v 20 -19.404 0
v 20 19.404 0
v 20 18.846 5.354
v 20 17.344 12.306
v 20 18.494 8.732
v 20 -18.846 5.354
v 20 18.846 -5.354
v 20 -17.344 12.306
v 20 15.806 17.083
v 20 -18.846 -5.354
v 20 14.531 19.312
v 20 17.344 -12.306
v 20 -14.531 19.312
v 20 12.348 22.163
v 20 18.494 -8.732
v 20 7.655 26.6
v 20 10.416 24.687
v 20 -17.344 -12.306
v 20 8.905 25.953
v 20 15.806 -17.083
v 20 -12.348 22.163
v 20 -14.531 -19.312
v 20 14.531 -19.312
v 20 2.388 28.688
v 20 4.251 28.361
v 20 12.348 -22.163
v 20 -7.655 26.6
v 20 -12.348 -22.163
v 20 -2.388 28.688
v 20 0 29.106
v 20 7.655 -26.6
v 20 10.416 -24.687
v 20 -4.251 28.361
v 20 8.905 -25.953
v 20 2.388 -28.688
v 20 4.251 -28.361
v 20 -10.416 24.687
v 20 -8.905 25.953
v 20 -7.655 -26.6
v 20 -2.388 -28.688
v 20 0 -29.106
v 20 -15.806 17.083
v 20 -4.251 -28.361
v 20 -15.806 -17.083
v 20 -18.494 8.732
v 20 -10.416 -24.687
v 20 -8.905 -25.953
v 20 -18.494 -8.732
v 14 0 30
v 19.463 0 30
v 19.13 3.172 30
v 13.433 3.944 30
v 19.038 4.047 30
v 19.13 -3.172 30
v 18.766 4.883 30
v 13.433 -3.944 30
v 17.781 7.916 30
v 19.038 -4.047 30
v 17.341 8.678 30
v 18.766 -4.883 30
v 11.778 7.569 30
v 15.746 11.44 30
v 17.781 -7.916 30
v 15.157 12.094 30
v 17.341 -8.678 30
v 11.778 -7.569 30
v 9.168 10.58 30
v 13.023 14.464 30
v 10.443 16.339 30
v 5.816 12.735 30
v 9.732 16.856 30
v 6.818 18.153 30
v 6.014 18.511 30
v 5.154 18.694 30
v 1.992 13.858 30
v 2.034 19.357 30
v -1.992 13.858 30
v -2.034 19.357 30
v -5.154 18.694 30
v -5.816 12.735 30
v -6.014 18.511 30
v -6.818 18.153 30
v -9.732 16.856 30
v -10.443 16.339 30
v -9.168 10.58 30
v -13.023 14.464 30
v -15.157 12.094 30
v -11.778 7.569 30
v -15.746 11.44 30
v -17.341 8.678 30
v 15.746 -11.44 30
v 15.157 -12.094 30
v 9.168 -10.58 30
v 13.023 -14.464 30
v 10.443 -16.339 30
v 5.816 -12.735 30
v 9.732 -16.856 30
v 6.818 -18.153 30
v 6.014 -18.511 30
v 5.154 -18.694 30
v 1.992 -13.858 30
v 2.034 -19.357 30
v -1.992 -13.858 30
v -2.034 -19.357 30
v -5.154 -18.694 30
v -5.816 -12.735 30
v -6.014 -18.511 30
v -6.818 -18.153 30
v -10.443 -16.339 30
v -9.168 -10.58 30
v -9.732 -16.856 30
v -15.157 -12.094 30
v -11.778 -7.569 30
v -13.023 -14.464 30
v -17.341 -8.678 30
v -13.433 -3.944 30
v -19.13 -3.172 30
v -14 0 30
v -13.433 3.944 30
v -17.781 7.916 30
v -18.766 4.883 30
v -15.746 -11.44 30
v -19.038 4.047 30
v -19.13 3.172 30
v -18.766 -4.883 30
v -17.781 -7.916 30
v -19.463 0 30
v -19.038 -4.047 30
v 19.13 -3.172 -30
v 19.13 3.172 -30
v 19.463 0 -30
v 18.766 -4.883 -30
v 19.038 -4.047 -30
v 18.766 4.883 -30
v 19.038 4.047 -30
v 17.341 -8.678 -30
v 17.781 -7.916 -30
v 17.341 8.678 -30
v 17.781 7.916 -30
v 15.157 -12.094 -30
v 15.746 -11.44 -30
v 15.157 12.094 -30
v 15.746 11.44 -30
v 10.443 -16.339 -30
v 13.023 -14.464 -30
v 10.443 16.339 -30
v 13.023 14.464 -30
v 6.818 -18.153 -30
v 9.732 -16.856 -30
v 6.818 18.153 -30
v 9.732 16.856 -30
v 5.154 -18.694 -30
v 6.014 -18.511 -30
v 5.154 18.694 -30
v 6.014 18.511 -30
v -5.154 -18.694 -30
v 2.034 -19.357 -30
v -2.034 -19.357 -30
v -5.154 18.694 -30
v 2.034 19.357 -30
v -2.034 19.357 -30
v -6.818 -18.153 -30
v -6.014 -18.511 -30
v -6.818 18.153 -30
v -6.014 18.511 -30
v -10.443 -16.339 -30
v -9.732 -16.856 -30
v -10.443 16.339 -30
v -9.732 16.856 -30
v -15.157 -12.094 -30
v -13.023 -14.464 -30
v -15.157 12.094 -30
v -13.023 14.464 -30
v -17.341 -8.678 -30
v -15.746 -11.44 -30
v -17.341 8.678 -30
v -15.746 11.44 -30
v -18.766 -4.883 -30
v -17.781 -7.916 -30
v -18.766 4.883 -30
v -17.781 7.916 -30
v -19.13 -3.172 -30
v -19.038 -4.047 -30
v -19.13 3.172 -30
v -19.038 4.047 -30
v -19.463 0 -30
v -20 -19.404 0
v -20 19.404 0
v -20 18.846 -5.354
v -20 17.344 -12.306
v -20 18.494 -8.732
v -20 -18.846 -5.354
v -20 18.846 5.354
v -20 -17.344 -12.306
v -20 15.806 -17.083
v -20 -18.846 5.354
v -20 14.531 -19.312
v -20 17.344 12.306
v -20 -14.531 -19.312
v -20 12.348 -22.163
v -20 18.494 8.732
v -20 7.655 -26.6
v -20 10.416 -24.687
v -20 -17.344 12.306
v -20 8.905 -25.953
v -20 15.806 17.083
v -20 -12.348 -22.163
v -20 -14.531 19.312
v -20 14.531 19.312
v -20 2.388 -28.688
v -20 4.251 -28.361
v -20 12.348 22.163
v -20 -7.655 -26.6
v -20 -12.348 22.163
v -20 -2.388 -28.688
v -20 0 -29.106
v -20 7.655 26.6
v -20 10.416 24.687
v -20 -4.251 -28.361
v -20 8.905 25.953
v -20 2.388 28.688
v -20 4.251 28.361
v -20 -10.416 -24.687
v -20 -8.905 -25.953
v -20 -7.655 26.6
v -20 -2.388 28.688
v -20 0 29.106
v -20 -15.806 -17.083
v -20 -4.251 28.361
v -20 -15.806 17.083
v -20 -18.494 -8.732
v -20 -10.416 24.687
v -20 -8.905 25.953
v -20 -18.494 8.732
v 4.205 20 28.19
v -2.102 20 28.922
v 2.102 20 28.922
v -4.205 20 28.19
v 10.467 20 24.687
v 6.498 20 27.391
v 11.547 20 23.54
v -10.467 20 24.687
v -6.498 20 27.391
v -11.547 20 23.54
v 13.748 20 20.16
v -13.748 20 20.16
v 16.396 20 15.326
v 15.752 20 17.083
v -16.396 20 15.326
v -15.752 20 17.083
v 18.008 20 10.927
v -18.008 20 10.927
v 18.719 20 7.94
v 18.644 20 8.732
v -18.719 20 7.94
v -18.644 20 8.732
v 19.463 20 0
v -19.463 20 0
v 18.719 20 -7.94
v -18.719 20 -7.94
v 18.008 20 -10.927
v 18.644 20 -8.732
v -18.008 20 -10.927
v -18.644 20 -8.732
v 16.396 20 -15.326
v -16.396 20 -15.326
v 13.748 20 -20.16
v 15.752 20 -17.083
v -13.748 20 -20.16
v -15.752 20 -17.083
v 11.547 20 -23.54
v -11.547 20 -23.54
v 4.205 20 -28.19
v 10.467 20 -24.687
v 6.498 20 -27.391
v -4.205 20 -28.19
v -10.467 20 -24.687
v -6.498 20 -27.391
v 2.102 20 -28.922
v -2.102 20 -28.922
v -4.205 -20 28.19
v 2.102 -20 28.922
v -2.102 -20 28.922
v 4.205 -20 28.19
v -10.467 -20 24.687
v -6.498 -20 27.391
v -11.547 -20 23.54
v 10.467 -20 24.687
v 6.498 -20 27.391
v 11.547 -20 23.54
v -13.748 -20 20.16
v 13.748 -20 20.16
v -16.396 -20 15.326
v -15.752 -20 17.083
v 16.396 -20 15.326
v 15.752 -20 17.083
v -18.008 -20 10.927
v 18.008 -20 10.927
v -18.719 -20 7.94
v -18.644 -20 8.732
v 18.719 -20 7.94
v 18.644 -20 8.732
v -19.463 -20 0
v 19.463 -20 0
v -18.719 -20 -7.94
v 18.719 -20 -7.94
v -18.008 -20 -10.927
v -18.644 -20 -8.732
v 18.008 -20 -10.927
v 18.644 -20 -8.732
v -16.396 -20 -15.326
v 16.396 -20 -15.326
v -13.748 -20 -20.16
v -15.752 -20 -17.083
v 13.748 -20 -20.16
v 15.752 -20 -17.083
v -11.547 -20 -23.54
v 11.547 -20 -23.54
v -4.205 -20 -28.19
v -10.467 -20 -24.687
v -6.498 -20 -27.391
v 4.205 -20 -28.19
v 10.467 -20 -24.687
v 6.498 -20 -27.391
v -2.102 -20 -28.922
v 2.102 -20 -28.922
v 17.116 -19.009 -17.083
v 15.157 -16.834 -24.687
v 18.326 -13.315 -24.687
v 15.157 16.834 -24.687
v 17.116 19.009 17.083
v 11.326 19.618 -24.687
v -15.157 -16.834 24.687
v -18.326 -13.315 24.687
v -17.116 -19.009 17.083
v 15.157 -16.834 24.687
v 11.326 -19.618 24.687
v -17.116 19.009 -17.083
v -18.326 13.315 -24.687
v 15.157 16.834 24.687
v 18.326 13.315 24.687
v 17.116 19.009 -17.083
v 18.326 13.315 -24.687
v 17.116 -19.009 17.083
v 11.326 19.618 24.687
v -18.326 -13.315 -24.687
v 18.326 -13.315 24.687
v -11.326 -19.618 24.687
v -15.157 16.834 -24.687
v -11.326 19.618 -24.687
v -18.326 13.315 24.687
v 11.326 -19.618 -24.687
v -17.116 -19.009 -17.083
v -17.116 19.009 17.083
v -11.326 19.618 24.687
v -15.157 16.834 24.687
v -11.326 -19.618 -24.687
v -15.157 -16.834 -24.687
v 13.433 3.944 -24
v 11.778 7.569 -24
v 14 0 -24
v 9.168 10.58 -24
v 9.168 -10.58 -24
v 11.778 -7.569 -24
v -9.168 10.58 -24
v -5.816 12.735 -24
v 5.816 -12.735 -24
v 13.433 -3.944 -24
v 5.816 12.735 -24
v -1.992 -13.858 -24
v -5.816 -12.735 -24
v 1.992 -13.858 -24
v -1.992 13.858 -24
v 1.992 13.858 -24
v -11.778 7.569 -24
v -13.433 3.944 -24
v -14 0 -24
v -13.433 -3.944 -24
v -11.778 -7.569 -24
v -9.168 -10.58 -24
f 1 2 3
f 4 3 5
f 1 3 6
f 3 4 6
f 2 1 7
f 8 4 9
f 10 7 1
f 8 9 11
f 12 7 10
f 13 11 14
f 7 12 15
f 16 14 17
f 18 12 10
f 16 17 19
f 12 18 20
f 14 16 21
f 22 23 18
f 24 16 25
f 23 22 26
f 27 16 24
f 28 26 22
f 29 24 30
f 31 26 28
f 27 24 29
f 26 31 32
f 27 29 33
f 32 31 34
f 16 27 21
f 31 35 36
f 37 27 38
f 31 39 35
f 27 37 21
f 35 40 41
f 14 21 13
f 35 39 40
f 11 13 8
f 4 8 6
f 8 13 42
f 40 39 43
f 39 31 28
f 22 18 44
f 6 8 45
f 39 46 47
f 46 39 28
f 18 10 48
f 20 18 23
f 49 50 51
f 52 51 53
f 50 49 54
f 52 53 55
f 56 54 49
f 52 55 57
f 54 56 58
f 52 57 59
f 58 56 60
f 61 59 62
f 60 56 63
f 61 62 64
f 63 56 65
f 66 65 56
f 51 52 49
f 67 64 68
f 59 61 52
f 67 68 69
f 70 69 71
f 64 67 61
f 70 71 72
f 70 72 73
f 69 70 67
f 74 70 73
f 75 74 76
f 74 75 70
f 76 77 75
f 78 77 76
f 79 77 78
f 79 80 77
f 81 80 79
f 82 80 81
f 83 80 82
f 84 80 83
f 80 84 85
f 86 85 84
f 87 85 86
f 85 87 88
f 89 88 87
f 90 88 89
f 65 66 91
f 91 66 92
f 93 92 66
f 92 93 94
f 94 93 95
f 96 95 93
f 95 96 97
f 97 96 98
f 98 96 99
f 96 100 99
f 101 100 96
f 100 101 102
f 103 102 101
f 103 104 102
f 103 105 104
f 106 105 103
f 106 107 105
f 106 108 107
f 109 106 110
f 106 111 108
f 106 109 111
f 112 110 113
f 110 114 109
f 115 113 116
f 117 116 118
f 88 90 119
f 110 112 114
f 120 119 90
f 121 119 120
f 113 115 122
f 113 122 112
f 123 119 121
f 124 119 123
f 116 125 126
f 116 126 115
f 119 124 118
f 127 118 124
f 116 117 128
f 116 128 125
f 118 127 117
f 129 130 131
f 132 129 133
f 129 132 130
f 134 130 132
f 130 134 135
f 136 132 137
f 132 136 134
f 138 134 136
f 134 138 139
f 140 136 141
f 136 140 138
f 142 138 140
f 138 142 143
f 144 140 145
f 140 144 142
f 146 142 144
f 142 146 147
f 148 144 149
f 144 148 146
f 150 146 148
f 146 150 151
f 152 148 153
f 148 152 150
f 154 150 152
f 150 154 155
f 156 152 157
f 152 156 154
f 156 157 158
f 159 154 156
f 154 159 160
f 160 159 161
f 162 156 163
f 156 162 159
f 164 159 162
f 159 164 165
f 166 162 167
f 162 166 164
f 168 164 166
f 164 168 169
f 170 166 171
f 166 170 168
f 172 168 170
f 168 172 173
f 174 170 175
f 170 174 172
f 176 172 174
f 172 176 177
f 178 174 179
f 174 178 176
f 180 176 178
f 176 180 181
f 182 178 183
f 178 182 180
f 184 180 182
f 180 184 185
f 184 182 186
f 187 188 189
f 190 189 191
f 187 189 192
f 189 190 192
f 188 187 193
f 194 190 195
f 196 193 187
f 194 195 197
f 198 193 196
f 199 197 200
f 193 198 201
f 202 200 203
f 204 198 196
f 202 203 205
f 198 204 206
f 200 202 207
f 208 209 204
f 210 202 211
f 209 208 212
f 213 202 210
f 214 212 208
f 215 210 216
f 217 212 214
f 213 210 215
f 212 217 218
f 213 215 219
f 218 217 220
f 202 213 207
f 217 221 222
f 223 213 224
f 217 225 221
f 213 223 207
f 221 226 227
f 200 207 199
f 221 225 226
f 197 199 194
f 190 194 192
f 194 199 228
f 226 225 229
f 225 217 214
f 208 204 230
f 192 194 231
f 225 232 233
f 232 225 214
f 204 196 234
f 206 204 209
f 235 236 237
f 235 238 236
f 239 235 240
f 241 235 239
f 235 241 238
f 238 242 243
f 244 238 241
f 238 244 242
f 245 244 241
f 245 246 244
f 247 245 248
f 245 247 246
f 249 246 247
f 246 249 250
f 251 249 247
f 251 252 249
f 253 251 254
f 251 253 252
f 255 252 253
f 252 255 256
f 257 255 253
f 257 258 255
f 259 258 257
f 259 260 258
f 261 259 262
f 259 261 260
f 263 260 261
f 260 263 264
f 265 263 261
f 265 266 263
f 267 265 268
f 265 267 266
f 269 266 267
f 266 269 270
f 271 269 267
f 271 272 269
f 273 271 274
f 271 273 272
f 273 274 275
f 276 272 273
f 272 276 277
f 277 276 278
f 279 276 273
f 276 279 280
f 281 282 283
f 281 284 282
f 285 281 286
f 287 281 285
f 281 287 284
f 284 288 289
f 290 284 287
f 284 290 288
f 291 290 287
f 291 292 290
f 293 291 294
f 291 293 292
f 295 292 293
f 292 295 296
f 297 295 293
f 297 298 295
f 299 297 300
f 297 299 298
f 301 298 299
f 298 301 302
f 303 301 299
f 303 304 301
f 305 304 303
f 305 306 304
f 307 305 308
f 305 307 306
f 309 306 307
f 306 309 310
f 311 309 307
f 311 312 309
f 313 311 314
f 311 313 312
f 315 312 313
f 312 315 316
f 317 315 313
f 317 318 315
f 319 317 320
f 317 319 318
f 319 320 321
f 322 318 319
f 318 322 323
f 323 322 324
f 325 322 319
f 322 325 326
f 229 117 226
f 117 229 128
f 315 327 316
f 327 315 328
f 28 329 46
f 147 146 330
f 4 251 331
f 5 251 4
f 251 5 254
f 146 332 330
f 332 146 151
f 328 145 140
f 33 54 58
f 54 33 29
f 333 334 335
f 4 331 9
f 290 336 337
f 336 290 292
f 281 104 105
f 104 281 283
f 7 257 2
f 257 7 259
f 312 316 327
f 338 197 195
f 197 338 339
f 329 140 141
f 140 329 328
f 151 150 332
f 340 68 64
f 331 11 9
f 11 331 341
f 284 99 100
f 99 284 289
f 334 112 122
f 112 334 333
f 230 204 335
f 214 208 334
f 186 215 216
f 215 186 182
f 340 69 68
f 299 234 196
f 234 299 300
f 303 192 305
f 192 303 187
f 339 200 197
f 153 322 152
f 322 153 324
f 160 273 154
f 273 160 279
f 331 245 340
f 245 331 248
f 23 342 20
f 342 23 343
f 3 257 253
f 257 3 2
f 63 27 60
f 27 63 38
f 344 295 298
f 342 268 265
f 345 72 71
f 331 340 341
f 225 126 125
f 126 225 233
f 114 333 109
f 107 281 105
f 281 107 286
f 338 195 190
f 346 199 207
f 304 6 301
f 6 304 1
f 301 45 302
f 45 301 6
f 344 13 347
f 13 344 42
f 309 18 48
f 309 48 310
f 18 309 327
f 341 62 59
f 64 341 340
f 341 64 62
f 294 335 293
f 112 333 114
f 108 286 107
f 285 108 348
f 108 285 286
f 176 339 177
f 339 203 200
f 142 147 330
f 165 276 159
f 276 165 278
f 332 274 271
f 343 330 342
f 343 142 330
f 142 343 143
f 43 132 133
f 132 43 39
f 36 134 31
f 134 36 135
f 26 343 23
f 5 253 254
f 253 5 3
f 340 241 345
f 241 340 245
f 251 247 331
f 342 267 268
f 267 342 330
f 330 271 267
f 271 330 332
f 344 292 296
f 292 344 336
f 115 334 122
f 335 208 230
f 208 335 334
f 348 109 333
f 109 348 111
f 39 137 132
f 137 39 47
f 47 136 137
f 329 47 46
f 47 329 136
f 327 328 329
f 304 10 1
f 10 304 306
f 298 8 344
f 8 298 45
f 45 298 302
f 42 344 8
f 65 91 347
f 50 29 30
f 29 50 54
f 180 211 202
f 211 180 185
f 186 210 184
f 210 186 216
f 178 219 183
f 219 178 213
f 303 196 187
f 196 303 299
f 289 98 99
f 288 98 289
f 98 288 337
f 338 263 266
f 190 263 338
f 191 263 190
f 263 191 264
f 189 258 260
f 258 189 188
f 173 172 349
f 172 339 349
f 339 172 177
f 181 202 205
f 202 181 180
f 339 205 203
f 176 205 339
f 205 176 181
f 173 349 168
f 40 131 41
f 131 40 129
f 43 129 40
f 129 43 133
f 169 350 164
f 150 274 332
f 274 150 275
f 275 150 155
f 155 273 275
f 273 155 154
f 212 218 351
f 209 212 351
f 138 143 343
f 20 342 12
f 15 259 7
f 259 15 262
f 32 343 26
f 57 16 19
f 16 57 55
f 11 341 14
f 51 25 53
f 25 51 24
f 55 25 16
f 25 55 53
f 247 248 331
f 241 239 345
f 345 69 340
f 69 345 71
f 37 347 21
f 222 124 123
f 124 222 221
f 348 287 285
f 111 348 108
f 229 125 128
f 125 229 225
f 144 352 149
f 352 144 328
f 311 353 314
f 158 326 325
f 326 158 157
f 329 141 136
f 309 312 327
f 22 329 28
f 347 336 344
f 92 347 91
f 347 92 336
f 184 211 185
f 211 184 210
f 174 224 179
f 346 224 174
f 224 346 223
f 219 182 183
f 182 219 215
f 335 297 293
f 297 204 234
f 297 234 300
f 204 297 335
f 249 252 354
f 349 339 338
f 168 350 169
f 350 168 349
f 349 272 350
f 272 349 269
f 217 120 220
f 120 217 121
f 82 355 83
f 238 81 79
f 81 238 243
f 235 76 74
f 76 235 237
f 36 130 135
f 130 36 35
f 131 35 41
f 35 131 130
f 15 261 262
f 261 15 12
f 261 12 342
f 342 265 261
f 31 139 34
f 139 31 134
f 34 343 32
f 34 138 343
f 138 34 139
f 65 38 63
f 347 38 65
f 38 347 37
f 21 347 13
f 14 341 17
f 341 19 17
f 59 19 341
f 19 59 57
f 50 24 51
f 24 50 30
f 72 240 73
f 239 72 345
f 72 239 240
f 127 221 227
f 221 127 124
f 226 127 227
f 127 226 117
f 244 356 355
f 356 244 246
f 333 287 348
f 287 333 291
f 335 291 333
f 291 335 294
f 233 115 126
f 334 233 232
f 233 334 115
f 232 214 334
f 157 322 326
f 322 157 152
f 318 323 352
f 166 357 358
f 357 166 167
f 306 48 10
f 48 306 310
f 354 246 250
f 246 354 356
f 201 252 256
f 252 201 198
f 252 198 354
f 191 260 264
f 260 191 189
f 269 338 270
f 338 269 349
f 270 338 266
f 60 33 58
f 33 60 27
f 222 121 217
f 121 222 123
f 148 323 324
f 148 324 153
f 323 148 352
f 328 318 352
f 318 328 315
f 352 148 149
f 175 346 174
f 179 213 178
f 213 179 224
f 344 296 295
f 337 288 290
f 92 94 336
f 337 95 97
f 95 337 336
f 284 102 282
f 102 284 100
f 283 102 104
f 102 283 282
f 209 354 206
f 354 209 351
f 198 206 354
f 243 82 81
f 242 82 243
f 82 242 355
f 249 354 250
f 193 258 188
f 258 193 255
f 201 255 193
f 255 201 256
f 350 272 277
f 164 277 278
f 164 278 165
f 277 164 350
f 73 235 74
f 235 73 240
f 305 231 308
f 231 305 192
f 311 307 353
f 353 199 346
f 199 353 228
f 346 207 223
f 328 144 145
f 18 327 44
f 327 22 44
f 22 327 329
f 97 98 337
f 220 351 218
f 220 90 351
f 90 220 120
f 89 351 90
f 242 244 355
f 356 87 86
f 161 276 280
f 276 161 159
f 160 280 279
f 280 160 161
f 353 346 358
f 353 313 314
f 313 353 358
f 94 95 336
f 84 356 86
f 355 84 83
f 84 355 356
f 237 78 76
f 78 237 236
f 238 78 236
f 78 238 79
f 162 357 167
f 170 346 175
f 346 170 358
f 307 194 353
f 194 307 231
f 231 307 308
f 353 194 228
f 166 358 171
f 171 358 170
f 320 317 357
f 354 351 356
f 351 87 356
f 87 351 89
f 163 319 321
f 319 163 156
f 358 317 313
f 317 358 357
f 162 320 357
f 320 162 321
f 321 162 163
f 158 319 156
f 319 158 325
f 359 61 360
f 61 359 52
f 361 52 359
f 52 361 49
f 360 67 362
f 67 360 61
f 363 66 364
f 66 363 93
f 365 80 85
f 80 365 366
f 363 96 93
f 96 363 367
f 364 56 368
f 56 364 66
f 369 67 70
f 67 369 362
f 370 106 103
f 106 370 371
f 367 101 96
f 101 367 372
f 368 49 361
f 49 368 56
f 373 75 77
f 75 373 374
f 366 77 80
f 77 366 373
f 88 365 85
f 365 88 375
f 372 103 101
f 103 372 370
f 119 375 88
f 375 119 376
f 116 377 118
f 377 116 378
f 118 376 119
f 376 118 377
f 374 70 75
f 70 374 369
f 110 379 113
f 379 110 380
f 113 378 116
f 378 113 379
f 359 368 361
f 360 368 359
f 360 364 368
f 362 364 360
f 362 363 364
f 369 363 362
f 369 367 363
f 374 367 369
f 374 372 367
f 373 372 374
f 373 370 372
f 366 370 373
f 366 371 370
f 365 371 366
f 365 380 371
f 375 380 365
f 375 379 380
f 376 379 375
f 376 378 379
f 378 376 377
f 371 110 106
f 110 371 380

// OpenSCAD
  scale([2,2,3])
  {
    difference()
    {
      intersection()
      {
          color("Green")
          cube([20,20,20], center=true);
          color("Blue")
          sphere(14);
      }
      translate([0,0,-10+2])
        cylinder(r=7,h=20+2);
    }
  }
